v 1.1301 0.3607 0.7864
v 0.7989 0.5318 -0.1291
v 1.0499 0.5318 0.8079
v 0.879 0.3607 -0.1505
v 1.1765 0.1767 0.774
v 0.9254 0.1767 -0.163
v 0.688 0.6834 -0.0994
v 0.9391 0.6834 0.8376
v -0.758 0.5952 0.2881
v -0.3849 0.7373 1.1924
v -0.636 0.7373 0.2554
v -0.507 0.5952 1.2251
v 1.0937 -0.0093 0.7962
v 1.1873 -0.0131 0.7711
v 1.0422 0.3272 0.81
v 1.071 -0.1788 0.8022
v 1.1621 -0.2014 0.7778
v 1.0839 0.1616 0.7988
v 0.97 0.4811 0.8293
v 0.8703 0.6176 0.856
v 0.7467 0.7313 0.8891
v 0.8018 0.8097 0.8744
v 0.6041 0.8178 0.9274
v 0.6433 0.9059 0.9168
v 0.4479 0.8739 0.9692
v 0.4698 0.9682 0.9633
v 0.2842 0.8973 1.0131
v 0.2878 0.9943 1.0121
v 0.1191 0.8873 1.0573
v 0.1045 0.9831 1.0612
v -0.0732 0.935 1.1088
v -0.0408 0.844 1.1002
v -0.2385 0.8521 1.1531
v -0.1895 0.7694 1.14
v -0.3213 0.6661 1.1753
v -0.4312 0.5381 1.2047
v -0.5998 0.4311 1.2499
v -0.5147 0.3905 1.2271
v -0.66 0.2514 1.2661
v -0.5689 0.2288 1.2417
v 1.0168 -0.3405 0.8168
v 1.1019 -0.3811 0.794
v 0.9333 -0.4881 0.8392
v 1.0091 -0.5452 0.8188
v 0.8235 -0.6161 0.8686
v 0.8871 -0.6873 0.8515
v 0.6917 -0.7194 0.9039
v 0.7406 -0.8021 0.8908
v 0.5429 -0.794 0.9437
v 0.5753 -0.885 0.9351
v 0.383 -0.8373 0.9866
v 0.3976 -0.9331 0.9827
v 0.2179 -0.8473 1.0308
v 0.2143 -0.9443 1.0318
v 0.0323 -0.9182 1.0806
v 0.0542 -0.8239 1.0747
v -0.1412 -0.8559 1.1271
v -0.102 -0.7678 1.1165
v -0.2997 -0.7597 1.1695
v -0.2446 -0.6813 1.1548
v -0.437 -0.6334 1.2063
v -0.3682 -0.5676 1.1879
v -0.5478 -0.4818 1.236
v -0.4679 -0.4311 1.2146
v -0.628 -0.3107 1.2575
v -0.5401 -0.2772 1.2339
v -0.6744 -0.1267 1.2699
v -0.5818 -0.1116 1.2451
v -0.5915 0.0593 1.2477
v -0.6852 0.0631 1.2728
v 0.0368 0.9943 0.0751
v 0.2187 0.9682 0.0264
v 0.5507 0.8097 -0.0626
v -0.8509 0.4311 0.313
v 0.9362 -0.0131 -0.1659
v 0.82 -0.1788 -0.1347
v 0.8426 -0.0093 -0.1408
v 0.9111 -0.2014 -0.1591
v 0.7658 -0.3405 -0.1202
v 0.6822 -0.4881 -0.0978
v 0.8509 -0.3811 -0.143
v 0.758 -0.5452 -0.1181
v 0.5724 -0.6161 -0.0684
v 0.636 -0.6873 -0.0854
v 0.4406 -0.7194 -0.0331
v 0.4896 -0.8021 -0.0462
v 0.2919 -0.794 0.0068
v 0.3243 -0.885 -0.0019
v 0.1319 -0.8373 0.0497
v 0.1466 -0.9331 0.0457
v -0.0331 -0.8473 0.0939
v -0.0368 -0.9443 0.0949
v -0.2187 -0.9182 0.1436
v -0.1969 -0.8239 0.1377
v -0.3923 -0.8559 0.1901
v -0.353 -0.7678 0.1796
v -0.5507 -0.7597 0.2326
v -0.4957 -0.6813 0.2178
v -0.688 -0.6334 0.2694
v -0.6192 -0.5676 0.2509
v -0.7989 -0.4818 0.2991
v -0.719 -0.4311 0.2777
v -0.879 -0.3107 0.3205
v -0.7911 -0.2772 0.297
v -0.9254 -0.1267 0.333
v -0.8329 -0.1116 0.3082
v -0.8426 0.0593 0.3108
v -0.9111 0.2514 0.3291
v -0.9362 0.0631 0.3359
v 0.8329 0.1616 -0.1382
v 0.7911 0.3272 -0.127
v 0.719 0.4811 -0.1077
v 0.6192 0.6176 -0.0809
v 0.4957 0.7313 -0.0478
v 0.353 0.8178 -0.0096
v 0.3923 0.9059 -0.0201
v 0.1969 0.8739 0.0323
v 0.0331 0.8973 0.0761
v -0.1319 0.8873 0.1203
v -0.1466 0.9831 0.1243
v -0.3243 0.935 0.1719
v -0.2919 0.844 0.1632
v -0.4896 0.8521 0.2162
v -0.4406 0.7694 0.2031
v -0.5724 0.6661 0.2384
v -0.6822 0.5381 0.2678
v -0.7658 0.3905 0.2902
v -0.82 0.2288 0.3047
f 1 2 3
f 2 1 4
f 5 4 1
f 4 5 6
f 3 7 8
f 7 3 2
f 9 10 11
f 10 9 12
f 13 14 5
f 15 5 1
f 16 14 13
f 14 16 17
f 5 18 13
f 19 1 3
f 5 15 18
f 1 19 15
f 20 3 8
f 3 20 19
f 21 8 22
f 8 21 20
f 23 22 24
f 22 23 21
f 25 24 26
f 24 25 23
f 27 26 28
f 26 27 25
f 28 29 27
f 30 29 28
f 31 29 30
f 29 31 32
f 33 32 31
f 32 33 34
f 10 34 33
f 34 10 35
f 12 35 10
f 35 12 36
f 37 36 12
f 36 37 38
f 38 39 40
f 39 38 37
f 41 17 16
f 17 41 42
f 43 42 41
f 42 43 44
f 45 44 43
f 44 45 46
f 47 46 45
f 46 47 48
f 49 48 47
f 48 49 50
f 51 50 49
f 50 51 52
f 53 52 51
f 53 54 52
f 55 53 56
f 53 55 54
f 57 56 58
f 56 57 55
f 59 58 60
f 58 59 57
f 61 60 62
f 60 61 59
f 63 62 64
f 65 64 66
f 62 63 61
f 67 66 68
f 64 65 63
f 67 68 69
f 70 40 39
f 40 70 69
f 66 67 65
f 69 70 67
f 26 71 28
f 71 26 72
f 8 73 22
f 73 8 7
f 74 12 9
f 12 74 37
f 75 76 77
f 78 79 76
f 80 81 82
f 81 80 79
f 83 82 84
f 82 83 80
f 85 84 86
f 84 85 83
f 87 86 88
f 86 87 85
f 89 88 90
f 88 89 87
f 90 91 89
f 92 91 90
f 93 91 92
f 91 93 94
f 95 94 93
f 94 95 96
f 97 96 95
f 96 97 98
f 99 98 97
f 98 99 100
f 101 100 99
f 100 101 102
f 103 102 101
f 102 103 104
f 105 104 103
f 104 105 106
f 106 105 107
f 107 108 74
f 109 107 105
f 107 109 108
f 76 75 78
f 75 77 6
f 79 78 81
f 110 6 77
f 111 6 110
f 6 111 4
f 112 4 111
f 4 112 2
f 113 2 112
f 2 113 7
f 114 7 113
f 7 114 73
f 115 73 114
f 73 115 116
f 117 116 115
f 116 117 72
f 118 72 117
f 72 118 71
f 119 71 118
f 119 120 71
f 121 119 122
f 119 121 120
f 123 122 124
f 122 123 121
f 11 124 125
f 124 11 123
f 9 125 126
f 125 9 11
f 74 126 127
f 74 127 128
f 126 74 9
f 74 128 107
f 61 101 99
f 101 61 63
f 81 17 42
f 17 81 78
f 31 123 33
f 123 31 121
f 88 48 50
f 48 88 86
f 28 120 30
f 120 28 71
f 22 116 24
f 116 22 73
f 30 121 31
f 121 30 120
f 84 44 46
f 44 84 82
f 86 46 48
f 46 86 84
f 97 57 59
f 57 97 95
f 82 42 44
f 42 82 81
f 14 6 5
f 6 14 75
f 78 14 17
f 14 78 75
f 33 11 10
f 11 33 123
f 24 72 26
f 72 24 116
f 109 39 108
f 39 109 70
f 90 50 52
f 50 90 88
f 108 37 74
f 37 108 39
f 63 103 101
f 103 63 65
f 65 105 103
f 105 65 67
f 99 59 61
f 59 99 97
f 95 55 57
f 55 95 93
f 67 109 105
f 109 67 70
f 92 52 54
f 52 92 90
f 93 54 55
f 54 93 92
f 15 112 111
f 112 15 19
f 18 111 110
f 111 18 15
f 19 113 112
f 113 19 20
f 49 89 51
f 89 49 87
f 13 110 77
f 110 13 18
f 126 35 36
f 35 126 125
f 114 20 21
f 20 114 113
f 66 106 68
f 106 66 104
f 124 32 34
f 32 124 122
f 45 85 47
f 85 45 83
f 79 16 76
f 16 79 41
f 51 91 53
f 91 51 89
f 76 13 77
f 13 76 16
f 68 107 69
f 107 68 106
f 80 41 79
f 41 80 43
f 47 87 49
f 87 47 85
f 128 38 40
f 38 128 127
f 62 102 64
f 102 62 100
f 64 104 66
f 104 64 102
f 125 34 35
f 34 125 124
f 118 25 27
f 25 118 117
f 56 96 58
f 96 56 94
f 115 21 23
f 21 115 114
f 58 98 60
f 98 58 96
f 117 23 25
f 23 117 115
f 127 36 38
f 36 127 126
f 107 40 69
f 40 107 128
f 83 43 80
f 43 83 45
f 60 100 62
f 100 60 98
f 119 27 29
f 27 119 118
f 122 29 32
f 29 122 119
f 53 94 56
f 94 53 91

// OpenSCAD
difference() {
  union() {
//    for(i=[1:1:100] ) {
      translate([0,0.025000,0.085000])
      rotate(15.000000,[0,1,0])
      rotate(9.000000,[0,0,1])
      scale([0.970000,0.970000,0.970000])
      scale([1.000000,1,1])
      difference() {
        cylinder( r=1, h=1.000000, $fn=32 );
        translate([0,0,-0.02]) cylinder( r=0.9, h=2, $fn=32 );
      }

      translate([0,0.025000,0.085000])
      rotate(15.000000,[0,1,0])
      rotate(9.000000,[0,0,1])
      scale([0.970000,0.970000,0.970000])
      scale([1.000000,1,1])
      difference() {
        cylinder( r=1, h=1.000000, $fn=32 );
        translate([0,0,-0.02]) cylinder( r=0.9, h=2, $fn=32 );
      }


//    }
  }
}
